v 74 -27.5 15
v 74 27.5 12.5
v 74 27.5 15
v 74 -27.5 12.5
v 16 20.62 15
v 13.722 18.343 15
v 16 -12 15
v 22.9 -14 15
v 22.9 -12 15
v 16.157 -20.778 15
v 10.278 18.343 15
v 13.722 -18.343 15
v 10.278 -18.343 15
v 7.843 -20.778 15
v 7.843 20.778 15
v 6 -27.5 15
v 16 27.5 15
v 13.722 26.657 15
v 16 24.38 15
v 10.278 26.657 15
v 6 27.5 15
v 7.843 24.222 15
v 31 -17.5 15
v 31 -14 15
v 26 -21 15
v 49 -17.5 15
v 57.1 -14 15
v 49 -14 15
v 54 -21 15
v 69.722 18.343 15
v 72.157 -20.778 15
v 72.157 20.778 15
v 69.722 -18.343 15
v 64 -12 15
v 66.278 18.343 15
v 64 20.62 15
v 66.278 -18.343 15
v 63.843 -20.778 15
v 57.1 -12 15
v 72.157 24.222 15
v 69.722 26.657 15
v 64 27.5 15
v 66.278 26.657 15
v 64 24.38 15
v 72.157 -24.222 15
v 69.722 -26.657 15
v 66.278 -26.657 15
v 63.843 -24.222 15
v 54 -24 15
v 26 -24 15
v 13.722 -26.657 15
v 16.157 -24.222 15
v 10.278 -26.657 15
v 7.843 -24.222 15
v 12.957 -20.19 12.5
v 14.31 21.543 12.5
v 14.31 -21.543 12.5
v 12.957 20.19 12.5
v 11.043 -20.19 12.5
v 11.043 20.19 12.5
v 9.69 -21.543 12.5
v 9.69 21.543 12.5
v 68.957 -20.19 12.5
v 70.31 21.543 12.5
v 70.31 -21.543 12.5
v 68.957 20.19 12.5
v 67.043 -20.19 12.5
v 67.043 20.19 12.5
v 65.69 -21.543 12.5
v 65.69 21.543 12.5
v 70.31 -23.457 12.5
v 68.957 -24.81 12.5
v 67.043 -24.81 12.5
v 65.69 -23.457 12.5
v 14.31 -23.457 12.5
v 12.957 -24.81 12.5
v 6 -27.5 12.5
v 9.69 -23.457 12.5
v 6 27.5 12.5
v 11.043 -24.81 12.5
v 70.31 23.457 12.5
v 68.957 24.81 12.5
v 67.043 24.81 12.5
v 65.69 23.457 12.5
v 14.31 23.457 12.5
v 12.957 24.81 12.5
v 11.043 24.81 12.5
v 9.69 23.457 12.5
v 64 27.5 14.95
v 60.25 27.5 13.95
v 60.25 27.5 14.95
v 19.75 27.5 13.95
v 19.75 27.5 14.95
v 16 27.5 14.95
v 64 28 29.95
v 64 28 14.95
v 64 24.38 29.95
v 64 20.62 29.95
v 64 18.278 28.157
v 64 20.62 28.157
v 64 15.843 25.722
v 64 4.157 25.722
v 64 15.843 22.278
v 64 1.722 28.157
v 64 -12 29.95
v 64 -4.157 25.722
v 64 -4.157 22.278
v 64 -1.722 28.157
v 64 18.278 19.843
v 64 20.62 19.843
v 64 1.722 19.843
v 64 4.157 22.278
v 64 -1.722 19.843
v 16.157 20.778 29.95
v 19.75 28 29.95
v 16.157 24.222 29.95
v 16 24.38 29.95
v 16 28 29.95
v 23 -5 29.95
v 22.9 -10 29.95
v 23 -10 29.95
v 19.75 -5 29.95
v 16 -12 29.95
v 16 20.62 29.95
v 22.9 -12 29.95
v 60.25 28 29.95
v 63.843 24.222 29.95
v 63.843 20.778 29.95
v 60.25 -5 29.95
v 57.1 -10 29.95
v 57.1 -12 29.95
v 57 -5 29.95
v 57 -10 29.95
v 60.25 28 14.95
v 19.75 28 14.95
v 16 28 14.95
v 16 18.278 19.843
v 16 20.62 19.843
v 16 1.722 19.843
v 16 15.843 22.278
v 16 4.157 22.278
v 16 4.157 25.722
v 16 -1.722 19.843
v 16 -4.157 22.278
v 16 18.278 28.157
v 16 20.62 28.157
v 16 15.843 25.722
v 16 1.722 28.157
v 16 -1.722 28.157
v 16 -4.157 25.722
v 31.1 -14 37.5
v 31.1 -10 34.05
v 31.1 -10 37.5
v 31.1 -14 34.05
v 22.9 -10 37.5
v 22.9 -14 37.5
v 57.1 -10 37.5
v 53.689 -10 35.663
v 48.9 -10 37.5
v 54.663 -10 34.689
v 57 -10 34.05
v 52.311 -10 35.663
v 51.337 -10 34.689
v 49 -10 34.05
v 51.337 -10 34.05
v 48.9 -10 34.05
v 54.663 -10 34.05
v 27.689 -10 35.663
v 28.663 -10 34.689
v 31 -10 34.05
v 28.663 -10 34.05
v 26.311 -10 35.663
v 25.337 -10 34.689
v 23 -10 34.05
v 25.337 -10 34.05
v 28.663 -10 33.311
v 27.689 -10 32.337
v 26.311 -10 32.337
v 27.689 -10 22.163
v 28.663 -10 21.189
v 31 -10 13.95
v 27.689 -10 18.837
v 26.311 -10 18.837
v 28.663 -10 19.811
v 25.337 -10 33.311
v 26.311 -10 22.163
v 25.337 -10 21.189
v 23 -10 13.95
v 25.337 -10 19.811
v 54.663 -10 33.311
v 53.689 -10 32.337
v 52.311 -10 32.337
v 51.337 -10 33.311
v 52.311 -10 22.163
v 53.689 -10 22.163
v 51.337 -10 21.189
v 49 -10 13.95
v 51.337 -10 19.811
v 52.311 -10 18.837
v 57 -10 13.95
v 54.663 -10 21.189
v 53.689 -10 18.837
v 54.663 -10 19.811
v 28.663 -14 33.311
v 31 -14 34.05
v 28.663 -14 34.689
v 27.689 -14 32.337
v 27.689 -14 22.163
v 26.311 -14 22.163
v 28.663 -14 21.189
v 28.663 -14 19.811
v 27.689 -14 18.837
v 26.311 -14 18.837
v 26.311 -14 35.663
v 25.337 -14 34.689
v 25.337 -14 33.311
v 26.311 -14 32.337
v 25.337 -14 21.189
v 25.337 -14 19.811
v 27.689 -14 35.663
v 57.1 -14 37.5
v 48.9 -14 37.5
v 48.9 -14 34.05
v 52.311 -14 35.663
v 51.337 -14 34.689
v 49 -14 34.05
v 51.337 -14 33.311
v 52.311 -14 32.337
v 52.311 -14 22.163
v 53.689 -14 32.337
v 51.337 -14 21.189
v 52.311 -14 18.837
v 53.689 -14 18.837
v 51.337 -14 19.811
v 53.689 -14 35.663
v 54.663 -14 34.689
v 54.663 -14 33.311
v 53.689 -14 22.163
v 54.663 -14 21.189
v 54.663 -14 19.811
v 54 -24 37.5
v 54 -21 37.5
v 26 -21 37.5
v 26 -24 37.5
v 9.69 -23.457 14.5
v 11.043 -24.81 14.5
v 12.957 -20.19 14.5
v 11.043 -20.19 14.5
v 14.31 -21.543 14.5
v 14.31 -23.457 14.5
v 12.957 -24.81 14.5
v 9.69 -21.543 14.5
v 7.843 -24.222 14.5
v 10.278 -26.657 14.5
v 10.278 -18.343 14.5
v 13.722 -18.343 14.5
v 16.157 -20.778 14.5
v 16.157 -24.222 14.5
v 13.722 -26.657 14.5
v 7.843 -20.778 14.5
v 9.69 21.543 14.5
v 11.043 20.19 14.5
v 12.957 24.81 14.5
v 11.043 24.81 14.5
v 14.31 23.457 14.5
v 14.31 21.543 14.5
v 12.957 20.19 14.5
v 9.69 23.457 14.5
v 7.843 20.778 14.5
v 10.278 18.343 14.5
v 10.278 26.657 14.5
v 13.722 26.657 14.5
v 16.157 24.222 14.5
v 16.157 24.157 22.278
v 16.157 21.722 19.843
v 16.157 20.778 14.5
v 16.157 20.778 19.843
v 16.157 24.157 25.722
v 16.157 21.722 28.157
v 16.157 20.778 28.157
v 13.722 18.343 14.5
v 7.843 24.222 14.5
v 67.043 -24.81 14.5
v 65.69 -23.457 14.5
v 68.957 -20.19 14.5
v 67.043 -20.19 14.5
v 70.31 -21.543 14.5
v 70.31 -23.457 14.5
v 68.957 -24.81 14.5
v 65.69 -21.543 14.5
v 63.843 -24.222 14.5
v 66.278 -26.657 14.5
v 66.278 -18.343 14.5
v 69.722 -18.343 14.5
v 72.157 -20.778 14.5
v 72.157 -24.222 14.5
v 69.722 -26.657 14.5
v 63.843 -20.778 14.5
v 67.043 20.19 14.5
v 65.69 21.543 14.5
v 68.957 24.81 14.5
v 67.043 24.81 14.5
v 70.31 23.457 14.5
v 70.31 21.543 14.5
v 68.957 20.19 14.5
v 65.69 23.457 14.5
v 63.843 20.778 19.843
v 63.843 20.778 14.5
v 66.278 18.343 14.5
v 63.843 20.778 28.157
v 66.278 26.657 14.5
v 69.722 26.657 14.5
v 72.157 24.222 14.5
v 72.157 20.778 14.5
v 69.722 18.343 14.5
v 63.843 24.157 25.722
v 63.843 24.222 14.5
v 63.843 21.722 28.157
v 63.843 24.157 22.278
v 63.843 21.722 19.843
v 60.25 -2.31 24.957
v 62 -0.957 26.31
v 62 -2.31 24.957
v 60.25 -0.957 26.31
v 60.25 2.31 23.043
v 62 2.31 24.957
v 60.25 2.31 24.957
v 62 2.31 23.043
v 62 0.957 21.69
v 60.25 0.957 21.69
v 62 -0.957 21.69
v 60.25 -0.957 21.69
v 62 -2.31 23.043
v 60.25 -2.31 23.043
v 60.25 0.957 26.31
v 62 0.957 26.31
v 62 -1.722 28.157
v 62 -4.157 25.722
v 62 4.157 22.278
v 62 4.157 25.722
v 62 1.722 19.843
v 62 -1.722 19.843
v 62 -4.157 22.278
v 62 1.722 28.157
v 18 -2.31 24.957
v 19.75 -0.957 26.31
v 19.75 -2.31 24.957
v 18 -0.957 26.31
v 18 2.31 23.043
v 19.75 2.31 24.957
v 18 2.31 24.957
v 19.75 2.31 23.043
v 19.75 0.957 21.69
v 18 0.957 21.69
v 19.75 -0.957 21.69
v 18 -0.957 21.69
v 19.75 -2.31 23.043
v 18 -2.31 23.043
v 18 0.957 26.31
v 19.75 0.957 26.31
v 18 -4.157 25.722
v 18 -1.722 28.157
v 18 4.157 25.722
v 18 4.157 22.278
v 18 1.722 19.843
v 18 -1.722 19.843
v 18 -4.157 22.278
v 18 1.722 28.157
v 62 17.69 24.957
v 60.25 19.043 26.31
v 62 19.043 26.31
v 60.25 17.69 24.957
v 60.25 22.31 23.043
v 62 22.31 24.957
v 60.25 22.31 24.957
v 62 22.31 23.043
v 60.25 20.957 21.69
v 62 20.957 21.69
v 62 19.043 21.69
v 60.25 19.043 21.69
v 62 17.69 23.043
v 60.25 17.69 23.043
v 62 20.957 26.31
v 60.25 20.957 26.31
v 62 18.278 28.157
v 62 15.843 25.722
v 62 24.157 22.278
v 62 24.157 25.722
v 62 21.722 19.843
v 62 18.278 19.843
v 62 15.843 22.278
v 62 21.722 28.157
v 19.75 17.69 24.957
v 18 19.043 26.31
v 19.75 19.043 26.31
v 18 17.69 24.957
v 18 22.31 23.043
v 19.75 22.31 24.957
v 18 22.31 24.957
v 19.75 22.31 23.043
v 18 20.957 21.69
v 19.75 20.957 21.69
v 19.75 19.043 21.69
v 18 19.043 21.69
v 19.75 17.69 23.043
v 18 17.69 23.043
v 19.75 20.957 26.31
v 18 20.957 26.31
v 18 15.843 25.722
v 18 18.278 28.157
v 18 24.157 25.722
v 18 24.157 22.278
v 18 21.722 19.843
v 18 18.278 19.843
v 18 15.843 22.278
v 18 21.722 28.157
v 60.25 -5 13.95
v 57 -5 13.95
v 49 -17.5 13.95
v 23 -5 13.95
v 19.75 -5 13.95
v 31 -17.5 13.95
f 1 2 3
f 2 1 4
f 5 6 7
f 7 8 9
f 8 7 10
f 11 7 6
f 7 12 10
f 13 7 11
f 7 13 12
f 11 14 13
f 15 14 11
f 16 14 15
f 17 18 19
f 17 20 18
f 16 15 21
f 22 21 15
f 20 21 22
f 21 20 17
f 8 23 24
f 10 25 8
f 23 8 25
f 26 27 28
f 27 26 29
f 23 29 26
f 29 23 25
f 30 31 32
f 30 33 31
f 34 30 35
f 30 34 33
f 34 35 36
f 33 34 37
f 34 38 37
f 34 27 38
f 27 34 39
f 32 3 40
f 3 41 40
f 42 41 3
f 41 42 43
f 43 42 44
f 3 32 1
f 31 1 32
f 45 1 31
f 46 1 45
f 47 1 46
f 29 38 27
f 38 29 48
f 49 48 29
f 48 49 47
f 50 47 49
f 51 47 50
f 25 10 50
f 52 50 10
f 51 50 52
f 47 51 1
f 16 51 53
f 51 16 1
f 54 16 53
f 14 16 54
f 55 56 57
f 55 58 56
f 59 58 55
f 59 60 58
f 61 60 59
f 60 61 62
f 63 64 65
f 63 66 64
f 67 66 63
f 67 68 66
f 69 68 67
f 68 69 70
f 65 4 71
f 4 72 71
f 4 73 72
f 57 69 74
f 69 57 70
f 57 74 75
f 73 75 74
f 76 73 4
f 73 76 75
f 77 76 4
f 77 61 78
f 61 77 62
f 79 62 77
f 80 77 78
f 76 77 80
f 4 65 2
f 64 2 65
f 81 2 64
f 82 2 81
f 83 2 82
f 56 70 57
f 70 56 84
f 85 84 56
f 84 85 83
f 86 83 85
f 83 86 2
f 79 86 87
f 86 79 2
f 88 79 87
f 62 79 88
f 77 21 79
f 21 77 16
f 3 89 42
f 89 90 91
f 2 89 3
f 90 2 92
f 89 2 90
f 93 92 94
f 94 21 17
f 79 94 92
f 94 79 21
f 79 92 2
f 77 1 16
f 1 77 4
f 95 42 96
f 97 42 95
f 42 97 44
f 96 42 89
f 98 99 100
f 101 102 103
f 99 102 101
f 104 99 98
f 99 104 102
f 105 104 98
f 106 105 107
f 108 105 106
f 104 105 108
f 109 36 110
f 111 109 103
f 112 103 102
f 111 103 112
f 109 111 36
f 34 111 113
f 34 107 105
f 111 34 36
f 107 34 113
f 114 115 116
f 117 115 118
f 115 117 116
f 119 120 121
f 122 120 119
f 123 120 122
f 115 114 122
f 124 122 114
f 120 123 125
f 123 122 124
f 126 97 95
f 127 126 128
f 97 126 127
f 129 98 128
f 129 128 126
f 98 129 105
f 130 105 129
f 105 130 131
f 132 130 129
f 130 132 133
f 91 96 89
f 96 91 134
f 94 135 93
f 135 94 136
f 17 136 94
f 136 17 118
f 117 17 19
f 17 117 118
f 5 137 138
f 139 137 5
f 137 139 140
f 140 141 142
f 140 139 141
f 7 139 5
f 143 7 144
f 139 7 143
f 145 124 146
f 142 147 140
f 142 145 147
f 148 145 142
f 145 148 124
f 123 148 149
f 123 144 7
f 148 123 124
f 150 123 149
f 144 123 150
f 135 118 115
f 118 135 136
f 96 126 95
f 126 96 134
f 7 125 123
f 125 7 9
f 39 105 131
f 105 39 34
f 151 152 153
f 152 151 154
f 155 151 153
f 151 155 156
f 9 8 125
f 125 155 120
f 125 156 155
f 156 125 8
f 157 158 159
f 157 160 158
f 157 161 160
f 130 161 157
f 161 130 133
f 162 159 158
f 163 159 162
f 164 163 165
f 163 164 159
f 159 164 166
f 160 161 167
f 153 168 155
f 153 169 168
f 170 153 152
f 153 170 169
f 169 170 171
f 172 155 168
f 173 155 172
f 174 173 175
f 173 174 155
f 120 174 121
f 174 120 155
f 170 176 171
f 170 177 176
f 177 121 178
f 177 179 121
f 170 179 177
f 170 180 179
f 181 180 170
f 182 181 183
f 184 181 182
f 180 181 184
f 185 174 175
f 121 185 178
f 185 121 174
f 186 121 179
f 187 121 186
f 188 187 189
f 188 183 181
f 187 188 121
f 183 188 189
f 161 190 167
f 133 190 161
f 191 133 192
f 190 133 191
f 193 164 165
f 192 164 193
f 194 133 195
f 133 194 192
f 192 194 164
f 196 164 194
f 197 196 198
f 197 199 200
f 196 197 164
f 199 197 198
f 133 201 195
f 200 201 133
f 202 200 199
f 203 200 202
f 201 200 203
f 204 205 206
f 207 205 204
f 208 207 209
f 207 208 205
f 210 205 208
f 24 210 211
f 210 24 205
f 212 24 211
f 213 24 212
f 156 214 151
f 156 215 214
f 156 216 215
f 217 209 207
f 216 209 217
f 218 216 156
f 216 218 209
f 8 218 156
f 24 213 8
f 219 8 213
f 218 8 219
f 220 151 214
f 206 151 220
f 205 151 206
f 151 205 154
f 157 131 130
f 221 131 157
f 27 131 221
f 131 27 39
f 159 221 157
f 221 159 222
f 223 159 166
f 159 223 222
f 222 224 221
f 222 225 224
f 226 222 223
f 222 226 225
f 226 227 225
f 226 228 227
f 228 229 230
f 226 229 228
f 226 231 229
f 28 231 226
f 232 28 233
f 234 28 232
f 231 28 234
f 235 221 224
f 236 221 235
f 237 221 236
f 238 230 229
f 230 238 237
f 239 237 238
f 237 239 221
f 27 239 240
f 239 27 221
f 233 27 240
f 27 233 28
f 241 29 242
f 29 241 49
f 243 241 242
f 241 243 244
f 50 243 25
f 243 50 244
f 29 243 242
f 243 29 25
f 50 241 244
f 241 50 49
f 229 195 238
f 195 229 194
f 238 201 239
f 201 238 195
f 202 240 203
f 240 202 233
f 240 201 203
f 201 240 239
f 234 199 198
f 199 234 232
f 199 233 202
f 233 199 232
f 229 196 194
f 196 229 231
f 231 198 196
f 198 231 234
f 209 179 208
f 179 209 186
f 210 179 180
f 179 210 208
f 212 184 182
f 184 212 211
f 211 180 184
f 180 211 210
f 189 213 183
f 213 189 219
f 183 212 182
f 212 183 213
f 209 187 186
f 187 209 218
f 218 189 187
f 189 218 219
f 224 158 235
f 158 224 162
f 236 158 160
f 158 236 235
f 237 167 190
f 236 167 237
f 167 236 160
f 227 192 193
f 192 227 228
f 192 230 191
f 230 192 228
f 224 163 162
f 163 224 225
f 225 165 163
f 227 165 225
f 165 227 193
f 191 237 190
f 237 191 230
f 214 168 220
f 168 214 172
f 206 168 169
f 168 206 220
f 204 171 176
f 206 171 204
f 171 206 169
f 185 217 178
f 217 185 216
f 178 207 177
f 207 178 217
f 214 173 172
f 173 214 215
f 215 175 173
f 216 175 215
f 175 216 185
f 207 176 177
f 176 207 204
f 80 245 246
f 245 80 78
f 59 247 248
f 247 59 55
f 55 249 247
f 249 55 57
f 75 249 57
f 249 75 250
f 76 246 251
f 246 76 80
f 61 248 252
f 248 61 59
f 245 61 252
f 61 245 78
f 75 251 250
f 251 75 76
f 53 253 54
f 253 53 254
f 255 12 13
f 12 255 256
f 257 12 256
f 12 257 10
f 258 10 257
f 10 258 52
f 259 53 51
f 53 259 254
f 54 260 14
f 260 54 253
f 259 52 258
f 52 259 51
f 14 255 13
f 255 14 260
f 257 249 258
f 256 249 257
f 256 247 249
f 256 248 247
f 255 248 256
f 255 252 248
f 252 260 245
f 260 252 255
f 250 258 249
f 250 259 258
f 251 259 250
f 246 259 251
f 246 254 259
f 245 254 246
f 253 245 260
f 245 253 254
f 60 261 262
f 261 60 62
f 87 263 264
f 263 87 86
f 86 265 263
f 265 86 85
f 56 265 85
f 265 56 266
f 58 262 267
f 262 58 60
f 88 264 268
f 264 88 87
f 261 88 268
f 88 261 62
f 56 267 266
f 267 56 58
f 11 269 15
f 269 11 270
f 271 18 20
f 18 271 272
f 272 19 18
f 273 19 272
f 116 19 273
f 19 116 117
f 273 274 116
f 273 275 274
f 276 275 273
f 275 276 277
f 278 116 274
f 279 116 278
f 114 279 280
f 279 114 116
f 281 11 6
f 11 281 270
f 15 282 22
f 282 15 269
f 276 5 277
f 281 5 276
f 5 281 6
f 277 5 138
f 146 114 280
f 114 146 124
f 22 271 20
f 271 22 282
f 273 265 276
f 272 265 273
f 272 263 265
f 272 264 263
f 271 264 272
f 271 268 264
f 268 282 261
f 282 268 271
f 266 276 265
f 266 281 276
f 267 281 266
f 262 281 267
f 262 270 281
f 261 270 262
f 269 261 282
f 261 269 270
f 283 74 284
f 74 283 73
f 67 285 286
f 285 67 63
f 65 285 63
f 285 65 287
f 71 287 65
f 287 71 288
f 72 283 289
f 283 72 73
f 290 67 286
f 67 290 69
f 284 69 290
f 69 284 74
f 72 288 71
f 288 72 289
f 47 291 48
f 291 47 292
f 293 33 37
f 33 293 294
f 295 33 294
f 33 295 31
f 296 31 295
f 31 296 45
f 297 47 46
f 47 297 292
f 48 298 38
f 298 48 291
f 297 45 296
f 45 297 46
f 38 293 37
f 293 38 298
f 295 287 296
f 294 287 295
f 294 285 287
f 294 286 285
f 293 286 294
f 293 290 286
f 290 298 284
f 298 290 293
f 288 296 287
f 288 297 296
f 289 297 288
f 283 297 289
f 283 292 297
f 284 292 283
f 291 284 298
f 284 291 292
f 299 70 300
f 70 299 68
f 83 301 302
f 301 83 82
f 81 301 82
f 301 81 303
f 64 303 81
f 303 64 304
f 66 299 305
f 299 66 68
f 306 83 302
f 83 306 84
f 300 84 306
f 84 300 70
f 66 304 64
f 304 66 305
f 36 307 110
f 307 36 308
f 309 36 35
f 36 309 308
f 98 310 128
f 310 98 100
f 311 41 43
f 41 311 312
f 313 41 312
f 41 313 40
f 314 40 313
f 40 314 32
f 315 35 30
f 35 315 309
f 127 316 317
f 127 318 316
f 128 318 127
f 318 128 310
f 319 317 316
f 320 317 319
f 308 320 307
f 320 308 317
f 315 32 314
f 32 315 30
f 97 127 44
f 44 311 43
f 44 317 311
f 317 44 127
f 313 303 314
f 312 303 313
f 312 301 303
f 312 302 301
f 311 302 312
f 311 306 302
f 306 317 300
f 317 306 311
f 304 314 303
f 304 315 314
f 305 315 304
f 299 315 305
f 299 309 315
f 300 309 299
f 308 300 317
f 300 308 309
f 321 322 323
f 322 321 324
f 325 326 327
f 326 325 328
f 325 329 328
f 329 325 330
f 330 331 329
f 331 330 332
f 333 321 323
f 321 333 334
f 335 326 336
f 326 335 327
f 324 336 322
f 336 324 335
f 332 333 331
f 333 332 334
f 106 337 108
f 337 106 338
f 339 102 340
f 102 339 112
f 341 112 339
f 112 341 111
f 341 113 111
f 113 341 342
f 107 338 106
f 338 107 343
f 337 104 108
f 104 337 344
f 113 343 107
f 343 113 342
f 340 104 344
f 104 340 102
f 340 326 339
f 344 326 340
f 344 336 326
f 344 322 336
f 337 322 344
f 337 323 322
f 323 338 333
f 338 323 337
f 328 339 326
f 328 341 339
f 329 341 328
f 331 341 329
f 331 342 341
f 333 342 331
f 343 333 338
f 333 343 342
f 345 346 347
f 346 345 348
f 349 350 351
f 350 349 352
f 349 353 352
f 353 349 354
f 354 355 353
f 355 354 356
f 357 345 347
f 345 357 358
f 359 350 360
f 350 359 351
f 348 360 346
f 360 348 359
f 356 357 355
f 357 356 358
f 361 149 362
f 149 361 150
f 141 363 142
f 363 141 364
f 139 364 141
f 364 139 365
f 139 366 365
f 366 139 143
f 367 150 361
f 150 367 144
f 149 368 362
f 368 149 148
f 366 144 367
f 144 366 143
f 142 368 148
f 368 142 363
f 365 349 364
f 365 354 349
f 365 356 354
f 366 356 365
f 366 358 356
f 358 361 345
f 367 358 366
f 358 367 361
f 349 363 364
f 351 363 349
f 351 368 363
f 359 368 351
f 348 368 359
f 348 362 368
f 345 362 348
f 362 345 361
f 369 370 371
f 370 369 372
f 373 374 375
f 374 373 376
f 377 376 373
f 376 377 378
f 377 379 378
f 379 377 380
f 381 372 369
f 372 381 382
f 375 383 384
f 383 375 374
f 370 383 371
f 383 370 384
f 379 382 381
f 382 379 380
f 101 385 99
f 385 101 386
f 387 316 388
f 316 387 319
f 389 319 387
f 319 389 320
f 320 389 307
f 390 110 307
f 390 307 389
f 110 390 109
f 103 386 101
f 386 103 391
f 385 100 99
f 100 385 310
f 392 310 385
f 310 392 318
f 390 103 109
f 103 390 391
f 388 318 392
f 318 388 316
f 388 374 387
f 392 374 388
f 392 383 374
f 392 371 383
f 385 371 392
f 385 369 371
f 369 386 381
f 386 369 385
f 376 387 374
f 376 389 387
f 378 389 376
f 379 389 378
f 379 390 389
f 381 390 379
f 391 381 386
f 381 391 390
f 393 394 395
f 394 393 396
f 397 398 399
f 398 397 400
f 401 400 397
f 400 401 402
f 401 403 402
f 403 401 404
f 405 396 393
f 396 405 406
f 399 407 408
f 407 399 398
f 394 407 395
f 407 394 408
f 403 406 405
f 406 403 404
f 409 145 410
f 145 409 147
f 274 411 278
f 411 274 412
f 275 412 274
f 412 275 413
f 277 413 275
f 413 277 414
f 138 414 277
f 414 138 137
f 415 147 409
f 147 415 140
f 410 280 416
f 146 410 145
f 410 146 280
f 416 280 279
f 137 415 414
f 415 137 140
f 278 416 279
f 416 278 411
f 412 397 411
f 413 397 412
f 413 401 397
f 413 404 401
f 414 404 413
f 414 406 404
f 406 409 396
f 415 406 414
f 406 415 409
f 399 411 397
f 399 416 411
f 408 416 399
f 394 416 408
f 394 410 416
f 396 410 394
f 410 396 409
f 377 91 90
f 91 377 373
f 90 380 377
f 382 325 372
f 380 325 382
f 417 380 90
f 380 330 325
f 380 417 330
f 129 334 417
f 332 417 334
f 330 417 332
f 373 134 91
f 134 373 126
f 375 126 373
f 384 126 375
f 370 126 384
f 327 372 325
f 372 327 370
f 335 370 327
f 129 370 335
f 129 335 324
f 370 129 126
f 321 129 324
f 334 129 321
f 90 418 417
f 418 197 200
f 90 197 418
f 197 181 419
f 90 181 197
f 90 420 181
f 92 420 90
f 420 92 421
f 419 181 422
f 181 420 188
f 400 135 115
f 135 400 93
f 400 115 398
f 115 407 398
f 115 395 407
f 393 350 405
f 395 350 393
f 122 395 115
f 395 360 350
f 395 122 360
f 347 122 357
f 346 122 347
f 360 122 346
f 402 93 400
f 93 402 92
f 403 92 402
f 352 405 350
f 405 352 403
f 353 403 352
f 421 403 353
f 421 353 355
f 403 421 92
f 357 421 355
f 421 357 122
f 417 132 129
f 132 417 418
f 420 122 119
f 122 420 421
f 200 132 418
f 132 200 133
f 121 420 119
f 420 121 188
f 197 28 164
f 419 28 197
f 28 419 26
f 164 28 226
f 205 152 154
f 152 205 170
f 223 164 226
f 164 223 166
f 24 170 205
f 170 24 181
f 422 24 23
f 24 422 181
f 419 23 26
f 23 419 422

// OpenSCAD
// file: echain.scad
PI=3.141592653589793;

module e_lement(elwidth,elheight,ellength){
translate([2.5,0,0])cube([ellength-5,elwidth,elheight]);
translate([0,0,elheight/8])cube([ellength,elwidth,elheight/4]);
}

module echain(elwidth,elheight,ellength,radius,numelems,pos){
	L=ellength*(numelems-2);
	travel=2*(L-radius*PI);
	echo(str(numelems,"pcs echain W",elwidth," H",elheight," pitch ", ellength," R",radius, " travel range:",travel,"mm"));
	H=radius*2+elheight;
	clamppos=max(0,min(pos,travel));
	els_in_curve=(radius*PI/ellength);
	angular_pitch=180/(els_in_curve+1);
	extrangle=(-2*ellength-clamppos)*angular_pitch/ellength/2;
	for(i=[1:numelems]){
		translate([-clamppos/2-1*ellength,0,0]){
			if(i*angular_pitch+extrangle<=180 && i*angular_pitch+extrangle>=0)
				translate([ellength/2,0,radius+elheight/2])
					rotate([0,i*angular_pitch+extrangle,0])
						translate([-ellength/2,0,-radius-elheight/2])
							e_lement(elwidth,elheight,ellength);
			if(i*angular_pitch+extrangle>180)
				translate(
				[ellength/2-(180-extrangle-i*angular_pitch)*ellength/(angular_pitch),
				0,radius+elheight/2])
					rotate([0,180,0])
						translate([-ellength/2,0,-radius-elheight/2])
							e_lement(elwidth,elheight,ellength);
			if(i*angular_pitch+extrangle<0)
				translate(
				[ellength/2+(-extrangle-i*angular_pitch)*ellength/(angular_pitch),
				0,radius+elheight/2])
					translate([-ellength/2,0,-radius-elheight/2])
						e_lement(elwidth,elheight,ellength);
		}
	}

}

echain(37.4,15,20,18,16,20);
// file: extrusions.scad
module Islot5(l=100){
translate([l/2,0,0]){cube([l,5,6.6],center=true);
translate([0,0,1])hull(){
cube([l,5,4.5],center=true);
translate([0,0,-1.5])cube([l,11,1.5],center=true);
}
}
}

module rcorner(r,l){
translate([l/2,0,0])difference(){
cube([l,r*2,r*2],center=true);
for(i=[-1,1])for(j=[-1,1])translate([0,i*r,j*r])rotate([0,90,0])cylinder(r=r,h=l+1,$fn=20,center=true);
}
}


module profilex020(l=100,x=4){
xwidth=x*10;
color("beige")difference(){
translate([0,-xwidth,-10])cube([l,2*xwidth,20]);
if(x>1)for(i=[1:x-1])translate([-.5,-xwidth+i*20,0])rotate([0,90,0])cylinder(r=12.5/2,$fn=20,h=l+1);

for(i=[0:x-1])translate([-.5,-xwidth+10+i*20,0]){
rotate([0,90,0])cylinder(r=4.3/2,$fn=20,h=l+1);
translate([0,0,-6.9])Islot5(l+1);
mirror([0,0,1])translate([0,0,-6.9])Islot5(l+1);
}
for(i=[0,1])mirror([0,i,0])translate([-.5,-xwidth+3.1,0])rotate([-90,0,0])Islot5(l+1);
for(i=[-xwidth,xwidth])for(j=[-10,10])translate([-.5,i,j])rcorner(2,l+1);
}
}

module profile8020(l=100){
echo(str("profile 8020 L:",l,"mm weight:",(l*.00189),"kg"));
profilex020(l=l,x=4);
}
module profile4020(l=100){
echo(str("profile 4020 L:",l,"mm weight:",(l*.00089),"kg"));
profilex020(l=l,x=2);
}
module profile6020(l=100){
echo(str("profile 6020 L:",l,"mm weight:",(l*.00128),"kg"));
profilex020(l=l,x=3);
}
module profile2020(l=100){
echo(str("profile 2020 L:",l,"mm weight:",(l*.00049),"kg"));
profilex020(l=l,x=1);
}


module drylinn80(len=100,pos=0){
echo(str("drylin NS-01-80 L:",len,"mm weight:",(len*.00114+0.1),"kg"));
xpos=max(0,min(pos,len-80));
color("gray")difference(){
translate([0,-40,0])cube([len,80,12]);
for(i=[0:round(len/150)]){
translate([25+150*i,0,-1]){
	translate([0,20,0])cylinder(r=2,$fn=20,h=30);
	translate([0,-20,0])cylinder(r=2,$fn=20,h=30);
	translate([0,20,4.5])cylinder(r=4,$fn=20,h=30);
	translate([0,-20,4.5])cylinder(r=4,$fn=20,h=30);
	
}
}
translate([-.5,-57/2,6.5])cube([len+1,57,6]);
}
color("beige")difference(){union(){
translate([xpos,-56/2,6.1])cube([80,56,3]);
translate([xpos+6,-56/2,5.9])cube([68,56,6.1]);
}for(i=[0,56])for(j=[-22.5,22.5])translate([xpos+12+i,j,0])cylinder(r=2,$fn=20,h=15);
}

}


module drylinn27(len=80,pos=0){
//echo(str("drylin NS-01-80 L:",len,"mm weight:",(len*.00114+0.1),"kg"));
xpos=max(0,min(pos,len-20));
color("gray")difference(){
translate([0,-27/2,0])cube([len,27,9]);
translate([-.5,-27/2-.1,-.1])cube([len+1,2.76,3.3]);
translate([-.5,27/2-2.75,-.1])cube([len+1,2.76,3.3]);
for(i=[0:round(len/150)]){
translate([25+150*i,0,-1]){
	translate([0,20,0])cylinder(r=2,$fn=20,h=30);
	translate([0,-20,0])cylinder(r=2,$fn=20,h=30);
	translate([0,20,4.5])cylinder(r=4,$fn=20,h=30);
	translate([0,-20,4.5])cylinder(r=4,$fn=20,h=30);
	
}
}
translate([-.5,-16/2,6.5])cube([len+1,16,6]);
}
color("beige")difference(){union(){
translate([xpos,-16/2,6.1])cube([34,16,3]);
translate([xpos+2,-16/2+1,6.6])cube([30,14,3]);
for(i=[0,20])translate([xpos+7	+i,0,9])cylinder(r=3.2,$fn=20,h=5.5);
}
for(i=[0,20])translate([xpos+7	+i,0,2])cylinder(r=2,$fn=20,h=15.5);
}
}


drylinn27(80);

module nema17(cutout=true){
difference(){union(){translate([0,0,-48/2])cube([42,42,48],true);
translate([0,0,-1])cylinder(r=11,h=3.5);

translate([0,0,-1])cylinder(r=2.5,h=25,$fn=30);
if(cutout==true){
translate([0,0,-1])cylinder(r=12.5,h=25);
for(i=[-31/2,31/2])for(j=[-31/2,31/2]){
translate([i,j,-1])cylinder(r=2,h=12,$fn=10);
translate([i,j,10])cylinder(r=4,h=31,$fn=10);
}
}
}
if(cutout!=true){for(i=[-31/2,31/2])for(j=[-31/2,31/2]){
translate([i,j,-4])cylinder(r=2,h=11,$fn=10);
}
}
}
}


module hsnema8(cutout=true){
difference(){
union(){
translate([0,0,30.1/2])cube([20,20,30.1],center=true);
translate([0,0,30.0])cylinder(r=7.5,h=1.4);
translate([0,0,-7])cylinder(r=2.5,h=7.1,$fn=30);
translate([0,0,30.0])cylinder(r=2.5,h=7.1,$fn=30);
if(cutout==true){
translate([0,0,30.0])cylinder(r=7.7,h=11.4);
translate([0,0,-10.0])cylinder(r=7.7,h=11.4);
for(i=[-15.7/2,15.7/2])for(j=[-15.7/2,15.7/2])translate([i,j,28.2+1]){
cylinder(r=2.5/2,h=10.1,$fn=10);
translate([0,0,8])cylinder(r=5/2,h=10,$fn=10);
}
}

}
for(i=[-15.7/2,15.7/2])for(j=[-15.7/2,15.7/2])translate([i,j,28.2])if(cutout!=true){
cylinder(r=2.5/2,h=2,$fn=10);
}
if(cutout!=true){
cylinder(r=2.5/2,h=80,center=true,$fn=20);
}
}
}

hsnema8();

module nema14(cutout=true){
difference(){union(){translate([0,0,-36/2])cube([35,35,36],true);
translate([0,0,-1])cylinder(r=11,h=3.5);

translate([0,0,-1])cylinder(r=2.5,h=25,$fn=30);
if(cutout==true){
translate([0,0,-1])cylinder(r=11.5,h=25);
for(i=[-26/2,26/2])for(j=[-26/2,26/2]){
translate([i,j,-1])cylinder(r=2,h=12,$fn=10);
translate([i,j,10])cylinder(r=4,h=31,$fn=10);
}
}
}
if(cutout!=true){for(i=[-26/2,26/2])for(j=[-26/2,26/2]){
translate([i,j,-4])cylinder(r=2,h=11,$fn=10);
}
}
}
}
// main file
use <extrusions.scad>
use <echain.scad>


*%translate([40,-5,24])rotate([0,0,90])color("grey",0.2)profile4020(115);
*%drylinn80(100,0);

module gt2lock(){difference(){cube([22,6,2],true);
for(i=[-13.5/2,13.5/2])translate([i,0,0])rotate([0,0,360/16])cylinder(r=2.1,h=30,center=true,$fn=8);
#for(i=[0:4])translate([0,-5+i*2,2-0.8])cube([8,1.2,3],true);
}
}
*translate(){
gt2lock();
translate([10,10,0])gt2lock();
translate([-0,20,0])gt2lock();
translate([10,30,0])gt2lock();
}
translate([40,0,15])xcarriage();

module xcarriage(){difference(){
union(){color("yellow",0.5)translate([0,0,-2.5/2])cube([68,55,2.5],true);
translate([0,8,7.45])cube([48,40,15],true);
translate([-13,-12,10])cube([8.2,4,25],true);
translate([13,-12,10])cube([8.2,4,25],true);
translate([0,-22.5,10])cube([28,3,25],true);
}

#for(i=[5.5,19])for(j=[13,-13])translate([j,0,i])rotate([90,0,0])rotate([0,0,360/16])cylinder(r=1.8,h=30,center=true,$fn=8);


translate([0,20,9])cube([40.5,50,20.1],true);
translate([0,22.5,9])cube([34,65,20.1],true);
translate([0,20,9])cube([18,75,20.1],true);
for(i=[-28,28])for(j=[-22.5,22.5])translate([i,j,-.5])rotate([0,0,360/16]){cylinder(r=2.5,h=30,center=true,$fn=8);
cylinder(r=4.5,h=30,$fn=8);
}


for(i=[0,20])for(j=[0,1])mirror([j,0,0])translate([22,i,9])rotate([0,90,0])rotate([0,0,360/16]){cylinder(r=2.5,h=30,center=true,$fn=8);
cylinder(r=4.5,h=30,$fn=8);
}

}
}
%translate([50,0,35])echain(37.4,15,20,18,16,0);
%translate([0,-22.5,27]){

translate([0,-13/2,0])cube([200,2,10],true);
translate([0,13/2,0])cube([200,2,10],true);

}
